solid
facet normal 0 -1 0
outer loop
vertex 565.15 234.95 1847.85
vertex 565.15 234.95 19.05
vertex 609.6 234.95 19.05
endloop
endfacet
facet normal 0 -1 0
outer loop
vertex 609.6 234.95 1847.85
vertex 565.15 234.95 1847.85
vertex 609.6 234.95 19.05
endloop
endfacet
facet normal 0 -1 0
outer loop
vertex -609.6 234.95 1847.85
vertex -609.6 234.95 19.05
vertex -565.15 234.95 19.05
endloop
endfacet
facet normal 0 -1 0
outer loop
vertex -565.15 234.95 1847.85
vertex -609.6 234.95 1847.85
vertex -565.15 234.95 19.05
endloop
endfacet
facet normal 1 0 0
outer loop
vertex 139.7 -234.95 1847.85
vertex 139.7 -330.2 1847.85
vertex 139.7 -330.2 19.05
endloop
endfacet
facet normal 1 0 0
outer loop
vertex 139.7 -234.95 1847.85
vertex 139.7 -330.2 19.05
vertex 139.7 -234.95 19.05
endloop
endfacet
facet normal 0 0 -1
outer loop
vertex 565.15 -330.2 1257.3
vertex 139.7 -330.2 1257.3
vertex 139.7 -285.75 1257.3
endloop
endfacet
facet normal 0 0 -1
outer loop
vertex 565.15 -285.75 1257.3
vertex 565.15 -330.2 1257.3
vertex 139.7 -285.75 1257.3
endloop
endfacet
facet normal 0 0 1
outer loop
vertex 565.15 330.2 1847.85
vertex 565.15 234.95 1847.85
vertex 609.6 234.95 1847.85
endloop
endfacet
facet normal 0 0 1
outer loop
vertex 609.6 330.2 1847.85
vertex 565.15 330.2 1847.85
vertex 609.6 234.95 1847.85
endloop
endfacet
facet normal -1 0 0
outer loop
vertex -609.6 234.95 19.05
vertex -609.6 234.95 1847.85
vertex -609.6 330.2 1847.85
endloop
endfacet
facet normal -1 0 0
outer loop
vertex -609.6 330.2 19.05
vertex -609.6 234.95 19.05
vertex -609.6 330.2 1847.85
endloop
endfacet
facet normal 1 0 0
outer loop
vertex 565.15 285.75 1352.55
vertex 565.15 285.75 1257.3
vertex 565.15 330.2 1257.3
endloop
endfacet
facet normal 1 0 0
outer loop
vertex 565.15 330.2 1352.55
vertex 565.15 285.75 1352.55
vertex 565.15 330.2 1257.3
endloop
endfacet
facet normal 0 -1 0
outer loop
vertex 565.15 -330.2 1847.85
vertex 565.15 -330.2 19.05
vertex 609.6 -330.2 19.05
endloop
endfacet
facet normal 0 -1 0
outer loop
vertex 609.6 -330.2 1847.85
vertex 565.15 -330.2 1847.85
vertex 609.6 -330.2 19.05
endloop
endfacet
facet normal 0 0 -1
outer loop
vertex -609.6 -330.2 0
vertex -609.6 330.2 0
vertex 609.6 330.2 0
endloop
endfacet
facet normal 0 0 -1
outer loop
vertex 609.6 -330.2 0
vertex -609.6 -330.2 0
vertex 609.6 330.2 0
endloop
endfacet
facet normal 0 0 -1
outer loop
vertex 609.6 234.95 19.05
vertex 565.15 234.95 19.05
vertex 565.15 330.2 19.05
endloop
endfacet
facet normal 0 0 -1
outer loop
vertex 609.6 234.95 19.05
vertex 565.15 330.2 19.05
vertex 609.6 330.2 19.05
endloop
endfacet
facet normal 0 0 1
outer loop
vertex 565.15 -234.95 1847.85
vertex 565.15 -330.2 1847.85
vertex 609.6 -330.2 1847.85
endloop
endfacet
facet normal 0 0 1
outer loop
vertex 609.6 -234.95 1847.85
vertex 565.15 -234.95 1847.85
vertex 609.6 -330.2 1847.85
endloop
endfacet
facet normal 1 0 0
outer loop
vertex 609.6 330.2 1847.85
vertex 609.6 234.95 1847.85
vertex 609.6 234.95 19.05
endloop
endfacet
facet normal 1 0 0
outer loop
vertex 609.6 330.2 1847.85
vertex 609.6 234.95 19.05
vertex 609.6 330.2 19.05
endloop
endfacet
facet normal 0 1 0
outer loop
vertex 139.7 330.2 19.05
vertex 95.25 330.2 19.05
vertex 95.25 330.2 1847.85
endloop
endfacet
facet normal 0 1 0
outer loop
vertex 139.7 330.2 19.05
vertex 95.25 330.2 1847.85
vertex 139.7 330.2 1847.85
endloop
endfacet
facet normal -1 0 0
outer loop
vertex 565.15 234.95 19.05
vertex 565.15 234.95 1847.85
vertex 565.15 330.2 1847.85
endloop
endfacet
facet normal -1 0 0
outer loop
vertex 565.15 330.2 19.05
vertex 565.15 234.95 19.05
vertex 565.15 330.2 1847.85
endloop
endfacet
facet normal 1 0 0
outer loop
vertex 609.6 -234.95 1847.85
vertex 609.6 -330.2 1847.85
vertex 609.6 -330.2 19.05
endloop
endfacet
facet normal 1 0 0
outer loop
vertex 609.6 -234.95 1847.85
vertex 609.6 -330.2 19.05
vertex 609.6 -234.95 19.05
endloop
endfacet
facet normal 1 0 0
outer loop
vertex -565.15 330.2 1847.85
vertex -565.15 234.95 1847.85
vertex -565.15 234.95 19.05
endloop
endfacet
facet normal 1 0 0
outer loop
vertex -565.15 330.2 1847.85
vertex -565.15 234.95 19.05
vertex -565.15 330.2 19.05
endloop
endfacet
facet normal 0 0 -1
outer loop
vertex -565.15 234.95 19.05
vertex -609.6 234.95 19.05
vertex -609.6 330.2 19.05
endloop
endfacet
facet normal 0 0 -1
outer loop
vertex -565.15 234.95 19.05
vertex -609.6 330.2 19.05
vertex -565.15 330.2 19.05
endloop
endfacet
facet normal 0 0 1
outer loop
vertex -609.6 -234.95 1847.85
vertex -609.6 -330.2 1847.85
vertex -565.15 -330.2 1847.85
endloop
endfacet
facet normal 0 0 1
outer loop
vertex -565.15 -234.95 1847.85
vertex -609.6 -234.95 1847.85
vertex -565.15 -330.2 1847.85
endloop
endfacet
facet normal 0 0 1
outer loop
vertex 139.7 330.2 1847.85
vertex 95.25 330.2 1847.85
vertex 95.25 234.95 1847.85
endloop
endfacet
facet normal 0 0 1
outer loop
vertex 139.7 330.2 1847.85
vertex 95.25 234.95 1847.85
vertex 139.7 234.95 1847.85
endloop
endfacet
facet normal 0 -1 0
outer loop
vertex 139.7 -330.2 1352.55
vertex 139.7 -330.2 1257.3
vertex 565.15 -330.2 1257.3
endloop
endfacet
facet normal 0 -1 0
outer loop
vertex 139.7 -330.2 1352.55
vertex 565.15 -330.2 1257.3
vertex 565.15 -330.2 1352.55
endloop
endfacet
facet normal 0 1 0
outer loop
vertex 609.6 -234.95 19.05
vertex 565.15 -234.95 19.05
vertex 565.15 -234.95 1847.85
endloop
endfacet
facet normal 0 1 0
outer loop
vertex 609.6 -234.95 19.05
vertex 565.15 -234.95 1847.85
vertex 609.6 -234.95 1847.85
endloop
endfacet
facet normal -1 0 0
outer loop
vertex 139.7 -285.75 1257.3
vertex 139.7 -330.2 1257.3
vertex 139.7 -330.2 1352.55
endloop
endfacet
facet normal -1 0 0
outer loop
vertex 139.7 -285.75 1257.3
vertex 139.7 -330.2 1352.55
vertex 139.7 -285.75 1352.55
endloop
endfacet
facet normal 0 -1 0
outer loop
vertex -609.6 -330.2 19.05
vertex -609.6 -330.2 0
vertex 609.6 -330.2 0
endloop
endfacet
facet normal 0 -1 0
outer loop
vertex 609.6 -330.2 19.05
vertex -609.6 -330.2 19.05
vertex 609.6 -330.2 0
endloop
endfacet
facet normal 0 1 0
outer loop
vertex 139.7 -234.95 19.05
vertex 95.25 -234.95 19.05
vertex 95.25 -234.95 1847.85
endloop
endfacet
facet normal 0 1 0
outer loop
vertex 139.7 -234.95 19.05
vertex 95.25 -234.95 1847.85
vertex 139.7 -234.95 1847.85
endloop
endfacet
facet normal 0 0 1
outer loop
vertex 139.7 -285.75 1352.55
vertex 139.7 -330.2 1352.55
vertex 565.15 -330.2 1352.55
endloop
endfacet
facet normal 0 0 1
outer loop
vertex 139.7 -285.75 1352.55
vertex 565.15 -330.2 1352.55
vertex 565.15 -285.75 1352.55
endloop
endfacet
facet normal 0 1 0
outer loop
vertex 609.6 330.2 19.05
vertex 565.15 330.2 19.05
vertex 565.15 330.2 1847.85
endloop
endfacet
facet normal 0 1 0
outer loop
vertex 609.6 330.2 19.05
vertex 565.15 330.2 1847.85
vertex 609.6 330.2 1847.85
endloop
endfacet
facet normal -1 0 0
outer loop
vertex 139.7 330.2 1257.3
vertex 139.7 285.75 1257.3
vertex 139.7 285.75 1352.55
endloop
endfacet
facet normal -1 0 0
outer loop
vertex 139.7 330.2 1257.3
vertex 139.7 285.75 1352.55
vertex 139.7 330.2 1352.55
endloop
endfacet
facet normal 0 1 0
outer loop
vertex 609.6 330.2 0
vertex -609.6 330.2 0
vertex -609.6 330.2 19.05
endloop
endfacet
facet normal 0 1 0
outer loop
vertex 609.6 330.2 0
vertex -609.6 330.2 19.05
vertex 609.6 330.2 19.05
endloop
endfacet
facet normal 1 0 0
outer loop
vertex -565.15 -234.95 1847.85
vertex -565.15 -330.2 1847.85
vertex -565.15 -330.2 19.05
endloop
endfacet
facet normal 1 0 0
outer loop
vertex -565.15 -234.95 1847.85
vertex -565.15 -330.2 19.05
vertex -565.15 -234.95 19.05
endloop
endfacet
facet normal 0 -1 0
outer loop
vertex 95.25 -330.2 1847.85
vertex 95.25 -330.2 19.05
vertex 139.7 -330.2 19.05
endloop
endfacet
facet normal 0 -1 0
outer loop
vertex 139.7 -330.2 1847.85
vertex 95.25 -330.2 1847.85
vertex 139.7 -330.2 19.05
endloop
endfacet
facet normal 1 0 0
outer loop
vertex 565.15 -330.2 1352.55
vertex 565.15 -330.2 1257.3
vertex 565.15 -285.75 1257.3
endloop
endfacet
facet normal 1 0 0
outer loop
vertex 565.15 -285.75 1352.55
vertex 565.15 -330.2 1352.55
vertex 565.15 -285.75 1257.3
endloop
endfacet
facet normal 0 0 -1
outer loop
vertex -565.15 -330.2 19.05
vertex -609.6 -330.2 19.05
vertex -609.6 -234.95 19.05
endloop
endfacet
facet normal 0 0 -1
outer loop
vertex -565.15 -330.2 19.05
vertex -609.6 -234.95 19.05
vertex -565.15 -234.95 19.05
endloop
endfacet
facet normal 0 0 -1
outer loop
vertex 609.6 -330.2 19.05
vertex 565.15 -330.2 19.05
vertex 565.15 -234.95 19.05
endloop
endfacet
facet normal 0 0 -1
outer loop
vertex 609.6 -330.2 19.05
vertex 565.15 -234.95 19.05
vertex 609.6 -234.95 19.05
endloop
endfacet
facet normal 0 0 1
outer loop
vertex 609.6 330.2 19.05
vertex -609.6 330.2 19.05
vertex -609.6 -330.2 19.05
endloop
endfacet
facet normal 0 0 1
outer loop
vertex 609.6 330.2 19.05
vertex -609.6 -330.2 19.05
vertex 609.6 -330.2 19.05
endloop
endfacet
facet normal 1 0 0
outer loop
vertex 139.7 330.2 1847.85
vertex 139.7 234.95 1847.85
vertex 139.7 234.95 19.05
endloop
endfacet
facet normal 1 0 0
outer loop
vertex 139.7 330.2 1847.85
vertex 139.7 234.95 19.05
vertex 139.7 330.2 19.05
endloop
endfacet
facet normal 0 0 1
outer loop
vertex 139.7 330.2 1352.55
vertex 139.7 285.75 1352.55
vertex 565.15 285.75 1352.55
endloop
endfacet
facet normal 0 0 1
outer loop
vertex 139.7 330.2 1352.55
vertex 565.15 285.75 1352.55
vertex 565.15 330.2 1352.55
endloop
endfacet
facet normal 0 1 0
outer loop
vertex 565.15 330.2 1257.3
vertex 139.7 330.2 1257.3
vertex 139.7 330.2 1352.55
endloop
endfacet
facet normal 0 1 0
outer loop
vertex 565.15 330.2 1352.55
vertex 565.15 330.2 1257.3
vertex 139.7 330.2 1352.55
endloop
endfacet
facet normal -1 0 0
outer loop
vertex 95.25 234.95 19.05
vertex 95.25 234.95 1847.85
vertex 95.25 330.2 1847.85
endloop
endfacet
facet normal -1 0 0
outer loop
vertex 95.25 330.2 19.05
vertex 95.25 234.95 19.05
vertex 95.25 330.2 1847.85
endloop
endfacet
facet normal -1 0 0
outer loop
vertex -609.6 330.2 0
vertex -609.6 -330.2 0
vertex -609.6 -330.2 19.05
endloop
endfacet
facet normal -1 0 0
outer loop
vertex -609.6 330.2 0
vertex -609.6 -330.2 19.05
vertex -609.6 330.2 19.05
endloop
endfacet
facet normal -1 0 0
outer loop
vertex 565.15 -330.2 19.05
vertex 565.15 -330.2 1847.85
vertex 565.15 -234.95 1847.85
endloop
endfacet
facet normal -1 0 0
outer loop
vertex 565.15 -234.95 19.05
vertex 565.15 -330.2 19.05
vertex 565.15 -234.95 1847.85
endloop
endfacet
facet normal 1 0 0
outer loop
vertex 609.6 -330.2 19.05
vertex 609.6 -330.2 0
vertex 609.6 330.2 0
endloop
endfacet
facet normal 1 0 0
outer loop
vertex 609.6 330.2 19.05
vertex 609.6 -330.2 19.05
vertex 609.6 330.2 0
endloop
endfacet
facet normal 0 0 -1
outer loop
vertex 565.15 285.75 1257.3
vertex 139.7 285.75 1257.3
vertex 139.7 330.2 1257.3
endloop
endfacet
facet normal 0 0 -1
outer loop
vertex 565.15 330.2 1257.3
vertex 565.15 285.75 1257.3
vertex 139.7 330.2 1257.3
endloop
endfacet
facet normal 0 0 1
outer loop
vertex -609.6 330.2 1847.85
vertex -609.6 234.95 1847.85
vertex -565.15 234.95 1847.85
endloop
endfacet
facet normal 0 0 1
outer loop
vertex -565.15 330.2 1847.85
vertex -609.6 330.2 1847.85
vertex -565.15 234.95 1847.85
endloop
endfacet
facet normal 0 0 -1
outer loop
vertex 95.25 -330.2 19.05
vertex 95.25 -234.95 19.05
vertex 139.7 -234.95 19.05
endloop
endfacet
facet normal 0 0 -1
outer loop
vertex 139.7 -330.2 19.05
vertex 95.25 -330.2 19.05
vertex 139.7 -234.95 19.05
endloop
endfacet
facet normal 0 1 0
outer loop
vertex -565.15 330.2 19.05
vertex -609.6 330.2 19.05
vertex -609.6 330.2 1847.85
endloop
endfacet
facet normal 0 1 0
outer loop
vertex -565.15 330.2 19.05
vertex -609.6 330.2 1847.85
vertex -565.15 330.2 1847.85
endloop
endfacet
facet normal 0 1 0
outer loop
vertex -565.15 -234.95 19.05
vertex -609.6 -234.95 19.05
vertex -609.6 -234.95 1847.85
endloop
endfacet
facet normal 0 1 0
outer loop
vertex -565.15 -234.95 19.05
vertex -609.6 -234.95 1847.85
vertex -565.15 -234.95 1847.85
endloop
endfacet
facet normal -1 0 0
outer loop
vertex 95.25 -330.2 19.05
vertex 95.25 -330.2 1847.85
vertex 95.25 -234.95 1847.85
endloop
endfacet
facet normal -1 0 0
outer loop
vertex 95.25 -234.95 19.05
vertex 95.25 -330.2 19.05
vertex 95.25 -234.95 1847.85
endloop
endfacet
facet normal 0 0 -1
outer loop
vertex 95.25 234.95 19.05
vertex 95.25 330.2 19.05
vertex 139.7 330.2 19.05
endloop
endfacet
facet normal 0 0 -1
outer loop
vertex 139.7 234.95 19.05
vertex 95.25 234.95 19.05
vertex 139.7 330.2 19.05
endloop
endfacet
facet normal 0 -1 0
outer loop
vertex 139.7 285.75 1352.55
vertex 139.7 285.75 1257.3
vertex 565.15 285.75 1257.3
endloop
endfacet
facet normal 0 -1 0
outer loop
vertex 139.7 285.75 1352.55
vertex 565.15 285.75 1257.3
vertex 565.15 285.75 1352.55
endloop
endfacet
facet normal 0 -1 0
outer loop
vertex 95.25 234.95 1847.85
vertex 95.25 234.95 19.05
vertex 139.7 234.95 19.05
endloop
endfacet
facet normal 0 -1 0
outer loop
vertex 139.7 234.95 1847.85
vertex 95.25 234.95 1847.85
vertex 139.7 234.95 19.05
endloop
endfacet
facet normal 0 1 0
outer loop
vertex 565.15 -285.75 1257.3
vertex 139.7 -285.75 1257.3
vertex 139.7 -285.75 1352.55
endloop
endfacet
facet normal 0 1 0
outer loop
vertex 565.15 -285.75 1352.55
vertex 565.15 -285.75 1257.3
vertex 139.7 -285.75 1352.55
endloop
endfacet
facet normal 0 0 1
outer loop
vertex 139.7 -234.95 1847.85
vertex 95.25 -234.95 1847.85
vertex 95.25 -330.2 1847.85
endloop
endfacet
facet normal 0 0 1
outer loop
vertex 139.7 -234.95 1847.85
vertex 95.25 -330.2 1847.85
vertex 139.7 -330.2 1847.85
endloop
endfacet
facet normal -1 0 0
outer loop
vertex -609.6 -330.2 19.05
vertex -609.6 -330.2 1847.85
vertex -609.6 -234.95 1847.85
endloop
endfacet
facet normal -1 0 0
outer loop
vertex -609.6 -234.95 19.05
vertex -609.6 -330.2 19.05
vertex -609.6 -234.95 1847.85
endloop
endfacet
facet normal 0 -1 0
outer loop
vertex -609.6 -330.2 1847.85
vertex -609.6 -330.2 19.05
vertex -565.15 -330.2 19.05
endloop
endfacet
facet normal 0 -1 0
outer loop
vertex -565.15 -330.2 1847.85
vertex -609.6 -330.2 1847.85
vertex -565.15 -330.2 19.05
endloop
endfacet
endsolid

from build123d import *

# Parameters (mm, degrees)
F0_W      = 1219.2
F0_H      = 660.4
F1_DEPTH  = 19.05
F2_W      = 44.45
F2_H      = 95.25
F3_DEPTH  = 1828.8
F4_DEPTH  = 1828.8
F5_DEPTH  = 1828.8
F6_DEPTH  = 1828.8
F7_DEPTH  = 1828.8
F8_DEPTH  = 1828.8
F9_W      = 44.45
F9_H      = 95.25
F10_DEPTH = 425.45
F11_W     = 44.45
F11_H     = 95.25
F12_DEPTH = 425.45


with BuildPart() as f1:
    # F0 (on Top) → F1 (new body)
    with BuildSketch(Plane.XY):
        Rectangle(F0_W, F0_H)
    extrude(amount=F1_DEPTH)


with BuildPart() as f3:
    # F2 (on face) → F3 (new body)
    with BuildSketch(Plane.XY.offset(19.05)):
        with Locations((-587.375, 282.575)):
            Rectangle(F2_W, F2_H)
    extrude(amount=F3_DEPTH)


with BuildPart() as f4:
    # F2 (on face) → F4 (new body)
    with BuildSketch(Plane.XY.offset(19.05)):
        with Locations((117.475, 282.575)):
            Rectangle(F2_W, F2_H)
    extrude(amount=F4_DEPTH)


with BuildPart() as f5:
    # F2 (on face) → F5 (new body)
    with BuildSketch(Plane.XY.offset(19.05)):
        with Locations((587.375, 282.575)):
            Rectangle(F2_W, F2_H)
    extrude(amount=F5_DEPTH)


with BuildPart() as f6:
    # F2 (on face) → F6 (new body)
    with BuildSketch(Plane.XY.offset(19.05)):
        with Locations((-587.375, -282.575)):
            Rectangle(F2_W, F2_H)
    extrude(amount=F6_DEPTH)


with BuildPart() as f7:
    # F2 (on face) → F7 (new body)
    with BuildSketch(Plane.XY.offset(19.05)):
        with Locations((117.475, -282.575)):
            Rectangle(F2_W, F2_H)
    extrude(amount=F7_DEPTH)


with BuildPart() as f8:
    # F2 (on face) → F8 (new body)
    with BuildSketch(Plane.XY.offset(19.05)):
        with Locations((587.375, -282.575)):
            Rectangle(F2_W, F2_H)
    extrude(amount=F8_DEPTH)


with BuildPart() as f10:
    # F9 (on face) → F10 (new body)
    with BuildSketch(Plane.YZ.offset(139.7)):
        with Locations((-307.975, 1304.925)):
            Rectangle(F9_W, F9_H)
    extrude(amount=F10_DEPTH)


with BuildPart() as f12:
    # F11 (on face) → F12 (new body)
    with BuildSketch(Plane.YZ.offset(139.7)):
        with Locations((307.975, 1304.925)):
            Rectangle(F11_W, F11_H)
    extrude(amount=F12_DEPTH)


solid = Compound([f1.part, f3.part, f4.part, f5.part, f6.part, f7.part, f8.part, f10.part, f12.part])
